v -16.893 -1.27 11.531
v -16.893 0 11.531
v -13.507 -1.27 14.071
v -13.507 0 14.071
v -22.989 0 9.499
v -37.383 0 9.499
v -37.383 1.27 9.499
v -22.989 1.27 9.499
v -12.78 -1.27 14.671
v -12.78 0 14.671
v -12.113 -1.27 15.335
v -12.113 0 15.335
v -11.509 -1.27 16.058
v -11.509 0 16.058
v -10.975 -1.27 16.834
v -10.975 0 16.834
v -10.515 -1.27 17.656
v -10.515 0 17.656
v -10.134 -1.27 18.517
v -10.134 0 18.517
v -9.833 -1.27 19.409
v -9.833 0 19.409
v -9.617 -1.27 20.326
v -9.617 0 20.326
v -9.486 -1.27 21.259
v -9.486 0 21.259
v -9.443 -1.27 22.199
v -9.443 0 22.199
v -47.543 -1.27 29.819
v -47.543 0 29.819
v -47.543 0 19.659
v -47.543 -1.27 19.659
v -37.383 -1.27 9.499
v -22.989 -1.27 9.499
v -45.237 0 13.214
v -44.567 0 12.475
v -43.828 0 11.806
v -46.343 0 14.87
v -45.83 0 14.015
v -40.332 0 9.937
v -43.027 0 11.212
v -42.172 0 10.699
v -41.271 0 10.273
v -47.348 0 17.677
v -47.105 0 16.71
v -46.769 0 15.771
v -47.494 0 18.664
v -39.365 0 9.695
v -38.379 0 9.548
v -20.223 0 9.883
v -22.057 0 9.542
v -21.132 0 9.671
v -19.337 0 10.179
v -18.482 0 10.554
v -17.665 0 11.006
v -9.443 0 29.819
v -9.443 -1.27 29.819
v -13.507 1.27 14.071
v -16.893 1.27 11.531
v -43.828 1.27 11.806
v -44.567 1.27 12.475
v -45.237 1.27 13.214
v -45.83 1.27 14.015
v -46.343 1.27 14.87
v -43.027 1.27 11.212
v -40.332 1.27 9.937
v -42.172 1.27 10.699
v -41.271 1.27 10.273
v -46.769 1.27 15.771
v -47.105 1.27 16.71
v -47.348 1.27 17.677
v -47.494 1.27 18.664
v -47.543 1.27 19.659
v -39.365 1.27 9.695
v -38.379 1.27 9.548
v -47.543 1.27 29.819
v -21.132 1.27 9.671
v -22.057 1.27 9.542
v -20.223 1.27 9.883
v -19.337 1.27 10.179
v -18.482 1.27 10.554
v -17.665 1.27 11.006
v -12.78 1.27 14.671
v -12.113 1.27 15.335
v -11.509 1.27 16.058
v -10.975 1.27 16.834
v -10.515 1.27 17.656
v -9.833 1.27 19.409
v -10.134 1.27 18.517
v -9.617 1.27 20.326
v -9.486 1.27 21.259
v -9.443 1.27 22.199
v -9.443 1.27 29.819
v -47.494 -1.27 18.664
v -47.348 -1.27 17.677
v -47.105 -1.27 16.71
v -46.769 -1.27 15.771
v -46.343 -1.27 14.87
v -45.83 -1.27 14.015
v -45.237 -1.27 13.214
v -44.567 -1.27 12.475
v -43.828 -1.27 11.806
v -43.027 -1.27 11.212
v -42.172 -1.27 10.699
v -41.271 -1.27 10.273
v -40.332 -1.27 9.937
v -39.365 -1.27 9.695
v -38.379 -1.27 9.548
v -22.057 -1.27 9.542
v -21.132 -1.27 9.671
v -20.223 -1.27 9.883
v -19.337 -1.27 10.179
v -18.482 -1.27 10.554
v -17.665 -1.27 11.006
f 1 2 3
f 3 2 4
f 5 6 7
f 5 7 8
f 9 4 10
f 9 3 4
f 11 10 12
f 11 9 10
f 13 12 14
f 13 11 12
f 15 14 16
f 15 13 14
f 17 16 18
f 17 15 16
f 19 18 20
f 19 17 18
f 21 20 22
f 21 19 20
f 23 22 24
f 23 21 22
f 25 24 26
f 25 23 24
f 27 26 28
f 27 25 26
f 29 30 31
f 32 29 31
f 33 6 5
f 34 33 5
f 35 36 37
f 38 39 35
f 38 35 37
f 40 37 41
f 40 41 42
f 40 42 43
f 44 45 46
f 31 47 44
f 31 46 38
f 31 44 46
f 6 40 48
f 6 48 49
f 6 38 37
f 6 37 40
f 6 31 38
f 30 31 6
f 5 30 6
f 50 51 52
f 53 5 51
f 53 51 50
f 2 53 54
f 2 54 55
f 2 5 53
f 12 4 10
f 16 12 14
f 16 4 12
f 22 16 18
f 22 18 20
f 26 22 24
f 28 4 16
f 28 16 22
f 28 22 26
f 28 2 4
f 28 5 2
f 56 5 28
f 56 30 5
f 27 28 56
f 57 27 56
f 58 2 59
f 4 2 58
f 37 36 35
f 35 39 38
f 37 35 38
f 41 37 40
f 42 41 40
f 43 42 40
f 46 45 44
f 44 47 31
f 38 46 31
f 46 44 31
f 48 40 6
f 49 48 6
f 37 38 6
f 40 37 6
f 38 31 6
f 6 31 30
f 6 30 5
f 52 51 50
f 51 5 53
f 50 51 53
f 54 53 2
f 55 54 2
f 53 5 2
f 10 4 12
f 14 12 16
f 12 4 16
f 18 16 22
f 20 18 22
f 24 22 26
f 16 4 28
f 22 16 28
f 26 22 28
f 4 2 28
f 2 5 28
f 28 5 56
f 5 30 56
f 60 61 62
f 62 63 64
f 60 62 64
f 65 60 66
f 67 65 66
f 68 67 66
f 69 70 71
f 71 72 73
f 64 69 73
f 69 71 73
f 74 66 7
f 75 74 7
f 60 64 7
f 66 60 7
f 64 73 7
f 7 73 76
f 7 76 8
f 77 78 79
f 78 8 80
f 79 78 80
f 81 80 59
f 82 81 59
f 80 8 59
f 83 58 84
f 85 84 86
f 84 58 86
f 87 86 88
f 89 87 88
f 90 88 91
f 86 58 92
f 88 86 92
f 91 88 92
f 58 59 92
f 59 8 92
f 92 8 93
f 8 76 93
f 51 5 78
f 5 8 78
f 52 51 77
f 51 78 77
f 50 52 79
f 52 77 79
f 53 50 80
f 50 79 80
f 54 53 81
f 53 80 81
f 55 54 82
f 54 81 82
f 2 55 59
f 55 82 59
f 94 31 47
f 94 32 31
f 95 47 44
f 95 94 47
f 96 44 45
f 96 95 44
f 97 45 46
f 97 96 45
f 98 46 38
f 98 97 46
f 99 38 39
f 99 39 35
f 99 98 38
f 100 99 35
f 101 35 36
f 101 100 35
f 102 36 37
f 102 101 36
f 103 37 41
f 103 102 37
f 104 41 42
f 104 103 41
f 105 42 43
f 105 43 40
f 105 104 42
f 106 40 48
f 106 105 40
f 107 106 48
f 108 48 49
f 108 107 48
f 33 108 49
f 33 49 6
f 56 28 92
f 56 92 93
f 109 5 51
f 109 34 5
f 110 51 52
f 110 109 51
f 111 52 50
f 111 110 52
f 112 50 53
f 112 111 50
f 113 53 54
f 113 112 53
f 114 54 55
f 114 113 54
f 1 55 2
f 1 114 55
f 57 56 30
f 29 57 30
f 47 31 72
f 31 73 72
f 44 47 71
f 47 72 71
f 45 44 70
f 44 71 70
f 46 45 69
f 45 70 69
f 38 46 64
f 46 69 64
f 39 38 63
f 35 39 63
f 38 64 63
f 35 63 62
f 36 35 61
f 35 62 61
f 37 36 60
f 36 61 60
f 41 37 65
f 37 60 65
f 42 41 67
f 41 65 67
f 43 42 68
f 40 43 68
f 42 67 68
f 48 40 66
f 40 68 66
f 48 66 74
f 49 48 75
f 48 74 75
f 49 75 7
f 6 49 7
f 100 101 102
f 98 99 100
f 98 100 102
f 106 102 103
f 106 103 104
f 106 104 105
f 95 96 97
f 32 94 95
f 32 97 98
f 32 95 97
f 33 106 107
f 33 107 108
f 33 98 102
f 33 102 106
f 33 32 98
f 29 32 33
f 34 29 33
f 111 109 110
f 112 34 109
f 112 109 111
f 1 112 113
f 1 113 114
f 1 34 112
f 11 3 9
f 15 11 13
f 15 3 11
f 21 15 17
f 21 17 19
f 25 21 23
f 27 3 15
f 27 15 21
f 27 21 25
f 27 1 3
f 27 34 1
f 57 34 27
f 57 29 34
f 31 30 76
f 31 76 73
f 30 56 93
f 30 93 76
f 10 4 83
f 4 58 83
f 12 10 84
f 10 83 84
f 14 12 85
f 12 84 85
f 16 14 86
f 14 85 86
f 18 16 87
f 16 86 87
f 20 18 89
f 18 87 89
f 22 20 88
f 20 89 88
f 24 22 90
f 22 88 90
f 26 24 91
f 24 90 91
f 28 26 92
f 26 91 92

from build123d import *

# Parameters (mm, degrees)
F1_DEPTH = 1.27
F2_R     = 10.16


with BuildPart() as f1:
    # F0 (on Front) → F1 (new body)
    with BuildSketch(Plane.XZ):
        Polygon((-9.442768, 29.819457), (-47.542768, 29.819457), (-47.542768, 9.499457), (-19.602768, 9.499457), (-9.442768, 17.119457), align=None)
    extrude(amount=F1_DEPTH)

    # F2
    f2_edges = [f1.edges().sort_by_distance(p)[0] for p in [
        (-47.542768, -0.635, 9.499457),
        (-19.602768, -0.635, 9.499457),
        (-9.442768, -0.635, 17.119457),
    ]]
    fillet(f2_edges, radius=F2_R)


with BuildPart() as f3_1:
    # F3: instance of F1
    add(f1.part.mirror(Plane.XZ))


solid = Compound([f1.part, f3_1.part])
